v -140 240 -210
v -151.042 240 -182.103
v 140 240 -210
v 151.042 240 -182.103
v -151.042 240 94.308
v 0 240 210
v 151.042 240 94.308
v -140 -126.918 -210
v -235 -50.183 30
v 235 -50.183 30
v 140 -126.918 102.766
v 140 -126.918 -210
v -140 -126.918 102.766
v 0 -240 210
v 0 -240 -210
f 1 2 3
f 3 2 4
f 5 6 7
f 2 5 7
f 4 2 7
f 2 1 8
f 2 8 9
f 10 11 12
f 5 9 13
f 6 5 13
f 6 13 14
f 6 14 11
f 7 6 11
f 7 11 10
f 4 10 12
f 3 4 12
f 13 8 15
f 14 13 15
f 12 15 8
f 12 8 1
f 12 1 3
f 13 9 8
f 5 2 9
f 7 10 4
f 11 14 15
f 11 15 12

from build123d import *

# Parameters (mm, degrees)
F0_W     = 470
F0_H     = 420
F1_DEPTH = 240
F3_DEPTH = 480.001
F5_DEPTH = 420.001


with BuildPart() as f1:
    # F0 (on Front) → F1 (new body, symmetric)
    with BuildSketch(Plane.XZ):
        Rectangle(F0_W, F0_H)
    extrude(amount=F1_DEPTH, both=True)

    # F2 (on face) → F3 (cut, through all)
    with BuildSketch(Plane.XZ.offset(240)):
        Polygon((0, 210), (235, 30), (235, 210), align=None)
        Polygon((235, 30), (140, -210), (235, -210), align=None)
        Polygon((-235, -210), (-140, -210), (-235, 30), align=None)
        Polygon((-235, 30), (0, 210), (-235, 210), align=None)
    extrude(amount=-F3_DEPTH, mode=Mode.SUBTRACT)

    # F4 (on face) → F5 (cut, through all)
    with BuildSketch(Plane(origin=(0, 0, -210), x_dir=(1, 0, 0), z_dir=(0, 0, -1))):
        Polygon((140, 126.917813), (235, 50.183472), (235, 240), (140, 240), align=None)
        Polygon((0, 240), (140, 126.917813), (140, 240), align=None)
        Polygon((235, 50.183472), (151.042473, -240), (235, -240), align=None)
        Polygon((-235, -240), (-151.042473, -240), (-235, 50.183472), align=None)
        Polygon((-235, 50.183472), (-140, 126.917813), (-140, 240), (-235, 240), align=None)
        Polygon((-140, 126.917813), (0, 240), (-140, 240), align=None)
    extrude(amount=-F5_DEPTH, mode=Mode.SUBTRACT)


solid = f1.part
